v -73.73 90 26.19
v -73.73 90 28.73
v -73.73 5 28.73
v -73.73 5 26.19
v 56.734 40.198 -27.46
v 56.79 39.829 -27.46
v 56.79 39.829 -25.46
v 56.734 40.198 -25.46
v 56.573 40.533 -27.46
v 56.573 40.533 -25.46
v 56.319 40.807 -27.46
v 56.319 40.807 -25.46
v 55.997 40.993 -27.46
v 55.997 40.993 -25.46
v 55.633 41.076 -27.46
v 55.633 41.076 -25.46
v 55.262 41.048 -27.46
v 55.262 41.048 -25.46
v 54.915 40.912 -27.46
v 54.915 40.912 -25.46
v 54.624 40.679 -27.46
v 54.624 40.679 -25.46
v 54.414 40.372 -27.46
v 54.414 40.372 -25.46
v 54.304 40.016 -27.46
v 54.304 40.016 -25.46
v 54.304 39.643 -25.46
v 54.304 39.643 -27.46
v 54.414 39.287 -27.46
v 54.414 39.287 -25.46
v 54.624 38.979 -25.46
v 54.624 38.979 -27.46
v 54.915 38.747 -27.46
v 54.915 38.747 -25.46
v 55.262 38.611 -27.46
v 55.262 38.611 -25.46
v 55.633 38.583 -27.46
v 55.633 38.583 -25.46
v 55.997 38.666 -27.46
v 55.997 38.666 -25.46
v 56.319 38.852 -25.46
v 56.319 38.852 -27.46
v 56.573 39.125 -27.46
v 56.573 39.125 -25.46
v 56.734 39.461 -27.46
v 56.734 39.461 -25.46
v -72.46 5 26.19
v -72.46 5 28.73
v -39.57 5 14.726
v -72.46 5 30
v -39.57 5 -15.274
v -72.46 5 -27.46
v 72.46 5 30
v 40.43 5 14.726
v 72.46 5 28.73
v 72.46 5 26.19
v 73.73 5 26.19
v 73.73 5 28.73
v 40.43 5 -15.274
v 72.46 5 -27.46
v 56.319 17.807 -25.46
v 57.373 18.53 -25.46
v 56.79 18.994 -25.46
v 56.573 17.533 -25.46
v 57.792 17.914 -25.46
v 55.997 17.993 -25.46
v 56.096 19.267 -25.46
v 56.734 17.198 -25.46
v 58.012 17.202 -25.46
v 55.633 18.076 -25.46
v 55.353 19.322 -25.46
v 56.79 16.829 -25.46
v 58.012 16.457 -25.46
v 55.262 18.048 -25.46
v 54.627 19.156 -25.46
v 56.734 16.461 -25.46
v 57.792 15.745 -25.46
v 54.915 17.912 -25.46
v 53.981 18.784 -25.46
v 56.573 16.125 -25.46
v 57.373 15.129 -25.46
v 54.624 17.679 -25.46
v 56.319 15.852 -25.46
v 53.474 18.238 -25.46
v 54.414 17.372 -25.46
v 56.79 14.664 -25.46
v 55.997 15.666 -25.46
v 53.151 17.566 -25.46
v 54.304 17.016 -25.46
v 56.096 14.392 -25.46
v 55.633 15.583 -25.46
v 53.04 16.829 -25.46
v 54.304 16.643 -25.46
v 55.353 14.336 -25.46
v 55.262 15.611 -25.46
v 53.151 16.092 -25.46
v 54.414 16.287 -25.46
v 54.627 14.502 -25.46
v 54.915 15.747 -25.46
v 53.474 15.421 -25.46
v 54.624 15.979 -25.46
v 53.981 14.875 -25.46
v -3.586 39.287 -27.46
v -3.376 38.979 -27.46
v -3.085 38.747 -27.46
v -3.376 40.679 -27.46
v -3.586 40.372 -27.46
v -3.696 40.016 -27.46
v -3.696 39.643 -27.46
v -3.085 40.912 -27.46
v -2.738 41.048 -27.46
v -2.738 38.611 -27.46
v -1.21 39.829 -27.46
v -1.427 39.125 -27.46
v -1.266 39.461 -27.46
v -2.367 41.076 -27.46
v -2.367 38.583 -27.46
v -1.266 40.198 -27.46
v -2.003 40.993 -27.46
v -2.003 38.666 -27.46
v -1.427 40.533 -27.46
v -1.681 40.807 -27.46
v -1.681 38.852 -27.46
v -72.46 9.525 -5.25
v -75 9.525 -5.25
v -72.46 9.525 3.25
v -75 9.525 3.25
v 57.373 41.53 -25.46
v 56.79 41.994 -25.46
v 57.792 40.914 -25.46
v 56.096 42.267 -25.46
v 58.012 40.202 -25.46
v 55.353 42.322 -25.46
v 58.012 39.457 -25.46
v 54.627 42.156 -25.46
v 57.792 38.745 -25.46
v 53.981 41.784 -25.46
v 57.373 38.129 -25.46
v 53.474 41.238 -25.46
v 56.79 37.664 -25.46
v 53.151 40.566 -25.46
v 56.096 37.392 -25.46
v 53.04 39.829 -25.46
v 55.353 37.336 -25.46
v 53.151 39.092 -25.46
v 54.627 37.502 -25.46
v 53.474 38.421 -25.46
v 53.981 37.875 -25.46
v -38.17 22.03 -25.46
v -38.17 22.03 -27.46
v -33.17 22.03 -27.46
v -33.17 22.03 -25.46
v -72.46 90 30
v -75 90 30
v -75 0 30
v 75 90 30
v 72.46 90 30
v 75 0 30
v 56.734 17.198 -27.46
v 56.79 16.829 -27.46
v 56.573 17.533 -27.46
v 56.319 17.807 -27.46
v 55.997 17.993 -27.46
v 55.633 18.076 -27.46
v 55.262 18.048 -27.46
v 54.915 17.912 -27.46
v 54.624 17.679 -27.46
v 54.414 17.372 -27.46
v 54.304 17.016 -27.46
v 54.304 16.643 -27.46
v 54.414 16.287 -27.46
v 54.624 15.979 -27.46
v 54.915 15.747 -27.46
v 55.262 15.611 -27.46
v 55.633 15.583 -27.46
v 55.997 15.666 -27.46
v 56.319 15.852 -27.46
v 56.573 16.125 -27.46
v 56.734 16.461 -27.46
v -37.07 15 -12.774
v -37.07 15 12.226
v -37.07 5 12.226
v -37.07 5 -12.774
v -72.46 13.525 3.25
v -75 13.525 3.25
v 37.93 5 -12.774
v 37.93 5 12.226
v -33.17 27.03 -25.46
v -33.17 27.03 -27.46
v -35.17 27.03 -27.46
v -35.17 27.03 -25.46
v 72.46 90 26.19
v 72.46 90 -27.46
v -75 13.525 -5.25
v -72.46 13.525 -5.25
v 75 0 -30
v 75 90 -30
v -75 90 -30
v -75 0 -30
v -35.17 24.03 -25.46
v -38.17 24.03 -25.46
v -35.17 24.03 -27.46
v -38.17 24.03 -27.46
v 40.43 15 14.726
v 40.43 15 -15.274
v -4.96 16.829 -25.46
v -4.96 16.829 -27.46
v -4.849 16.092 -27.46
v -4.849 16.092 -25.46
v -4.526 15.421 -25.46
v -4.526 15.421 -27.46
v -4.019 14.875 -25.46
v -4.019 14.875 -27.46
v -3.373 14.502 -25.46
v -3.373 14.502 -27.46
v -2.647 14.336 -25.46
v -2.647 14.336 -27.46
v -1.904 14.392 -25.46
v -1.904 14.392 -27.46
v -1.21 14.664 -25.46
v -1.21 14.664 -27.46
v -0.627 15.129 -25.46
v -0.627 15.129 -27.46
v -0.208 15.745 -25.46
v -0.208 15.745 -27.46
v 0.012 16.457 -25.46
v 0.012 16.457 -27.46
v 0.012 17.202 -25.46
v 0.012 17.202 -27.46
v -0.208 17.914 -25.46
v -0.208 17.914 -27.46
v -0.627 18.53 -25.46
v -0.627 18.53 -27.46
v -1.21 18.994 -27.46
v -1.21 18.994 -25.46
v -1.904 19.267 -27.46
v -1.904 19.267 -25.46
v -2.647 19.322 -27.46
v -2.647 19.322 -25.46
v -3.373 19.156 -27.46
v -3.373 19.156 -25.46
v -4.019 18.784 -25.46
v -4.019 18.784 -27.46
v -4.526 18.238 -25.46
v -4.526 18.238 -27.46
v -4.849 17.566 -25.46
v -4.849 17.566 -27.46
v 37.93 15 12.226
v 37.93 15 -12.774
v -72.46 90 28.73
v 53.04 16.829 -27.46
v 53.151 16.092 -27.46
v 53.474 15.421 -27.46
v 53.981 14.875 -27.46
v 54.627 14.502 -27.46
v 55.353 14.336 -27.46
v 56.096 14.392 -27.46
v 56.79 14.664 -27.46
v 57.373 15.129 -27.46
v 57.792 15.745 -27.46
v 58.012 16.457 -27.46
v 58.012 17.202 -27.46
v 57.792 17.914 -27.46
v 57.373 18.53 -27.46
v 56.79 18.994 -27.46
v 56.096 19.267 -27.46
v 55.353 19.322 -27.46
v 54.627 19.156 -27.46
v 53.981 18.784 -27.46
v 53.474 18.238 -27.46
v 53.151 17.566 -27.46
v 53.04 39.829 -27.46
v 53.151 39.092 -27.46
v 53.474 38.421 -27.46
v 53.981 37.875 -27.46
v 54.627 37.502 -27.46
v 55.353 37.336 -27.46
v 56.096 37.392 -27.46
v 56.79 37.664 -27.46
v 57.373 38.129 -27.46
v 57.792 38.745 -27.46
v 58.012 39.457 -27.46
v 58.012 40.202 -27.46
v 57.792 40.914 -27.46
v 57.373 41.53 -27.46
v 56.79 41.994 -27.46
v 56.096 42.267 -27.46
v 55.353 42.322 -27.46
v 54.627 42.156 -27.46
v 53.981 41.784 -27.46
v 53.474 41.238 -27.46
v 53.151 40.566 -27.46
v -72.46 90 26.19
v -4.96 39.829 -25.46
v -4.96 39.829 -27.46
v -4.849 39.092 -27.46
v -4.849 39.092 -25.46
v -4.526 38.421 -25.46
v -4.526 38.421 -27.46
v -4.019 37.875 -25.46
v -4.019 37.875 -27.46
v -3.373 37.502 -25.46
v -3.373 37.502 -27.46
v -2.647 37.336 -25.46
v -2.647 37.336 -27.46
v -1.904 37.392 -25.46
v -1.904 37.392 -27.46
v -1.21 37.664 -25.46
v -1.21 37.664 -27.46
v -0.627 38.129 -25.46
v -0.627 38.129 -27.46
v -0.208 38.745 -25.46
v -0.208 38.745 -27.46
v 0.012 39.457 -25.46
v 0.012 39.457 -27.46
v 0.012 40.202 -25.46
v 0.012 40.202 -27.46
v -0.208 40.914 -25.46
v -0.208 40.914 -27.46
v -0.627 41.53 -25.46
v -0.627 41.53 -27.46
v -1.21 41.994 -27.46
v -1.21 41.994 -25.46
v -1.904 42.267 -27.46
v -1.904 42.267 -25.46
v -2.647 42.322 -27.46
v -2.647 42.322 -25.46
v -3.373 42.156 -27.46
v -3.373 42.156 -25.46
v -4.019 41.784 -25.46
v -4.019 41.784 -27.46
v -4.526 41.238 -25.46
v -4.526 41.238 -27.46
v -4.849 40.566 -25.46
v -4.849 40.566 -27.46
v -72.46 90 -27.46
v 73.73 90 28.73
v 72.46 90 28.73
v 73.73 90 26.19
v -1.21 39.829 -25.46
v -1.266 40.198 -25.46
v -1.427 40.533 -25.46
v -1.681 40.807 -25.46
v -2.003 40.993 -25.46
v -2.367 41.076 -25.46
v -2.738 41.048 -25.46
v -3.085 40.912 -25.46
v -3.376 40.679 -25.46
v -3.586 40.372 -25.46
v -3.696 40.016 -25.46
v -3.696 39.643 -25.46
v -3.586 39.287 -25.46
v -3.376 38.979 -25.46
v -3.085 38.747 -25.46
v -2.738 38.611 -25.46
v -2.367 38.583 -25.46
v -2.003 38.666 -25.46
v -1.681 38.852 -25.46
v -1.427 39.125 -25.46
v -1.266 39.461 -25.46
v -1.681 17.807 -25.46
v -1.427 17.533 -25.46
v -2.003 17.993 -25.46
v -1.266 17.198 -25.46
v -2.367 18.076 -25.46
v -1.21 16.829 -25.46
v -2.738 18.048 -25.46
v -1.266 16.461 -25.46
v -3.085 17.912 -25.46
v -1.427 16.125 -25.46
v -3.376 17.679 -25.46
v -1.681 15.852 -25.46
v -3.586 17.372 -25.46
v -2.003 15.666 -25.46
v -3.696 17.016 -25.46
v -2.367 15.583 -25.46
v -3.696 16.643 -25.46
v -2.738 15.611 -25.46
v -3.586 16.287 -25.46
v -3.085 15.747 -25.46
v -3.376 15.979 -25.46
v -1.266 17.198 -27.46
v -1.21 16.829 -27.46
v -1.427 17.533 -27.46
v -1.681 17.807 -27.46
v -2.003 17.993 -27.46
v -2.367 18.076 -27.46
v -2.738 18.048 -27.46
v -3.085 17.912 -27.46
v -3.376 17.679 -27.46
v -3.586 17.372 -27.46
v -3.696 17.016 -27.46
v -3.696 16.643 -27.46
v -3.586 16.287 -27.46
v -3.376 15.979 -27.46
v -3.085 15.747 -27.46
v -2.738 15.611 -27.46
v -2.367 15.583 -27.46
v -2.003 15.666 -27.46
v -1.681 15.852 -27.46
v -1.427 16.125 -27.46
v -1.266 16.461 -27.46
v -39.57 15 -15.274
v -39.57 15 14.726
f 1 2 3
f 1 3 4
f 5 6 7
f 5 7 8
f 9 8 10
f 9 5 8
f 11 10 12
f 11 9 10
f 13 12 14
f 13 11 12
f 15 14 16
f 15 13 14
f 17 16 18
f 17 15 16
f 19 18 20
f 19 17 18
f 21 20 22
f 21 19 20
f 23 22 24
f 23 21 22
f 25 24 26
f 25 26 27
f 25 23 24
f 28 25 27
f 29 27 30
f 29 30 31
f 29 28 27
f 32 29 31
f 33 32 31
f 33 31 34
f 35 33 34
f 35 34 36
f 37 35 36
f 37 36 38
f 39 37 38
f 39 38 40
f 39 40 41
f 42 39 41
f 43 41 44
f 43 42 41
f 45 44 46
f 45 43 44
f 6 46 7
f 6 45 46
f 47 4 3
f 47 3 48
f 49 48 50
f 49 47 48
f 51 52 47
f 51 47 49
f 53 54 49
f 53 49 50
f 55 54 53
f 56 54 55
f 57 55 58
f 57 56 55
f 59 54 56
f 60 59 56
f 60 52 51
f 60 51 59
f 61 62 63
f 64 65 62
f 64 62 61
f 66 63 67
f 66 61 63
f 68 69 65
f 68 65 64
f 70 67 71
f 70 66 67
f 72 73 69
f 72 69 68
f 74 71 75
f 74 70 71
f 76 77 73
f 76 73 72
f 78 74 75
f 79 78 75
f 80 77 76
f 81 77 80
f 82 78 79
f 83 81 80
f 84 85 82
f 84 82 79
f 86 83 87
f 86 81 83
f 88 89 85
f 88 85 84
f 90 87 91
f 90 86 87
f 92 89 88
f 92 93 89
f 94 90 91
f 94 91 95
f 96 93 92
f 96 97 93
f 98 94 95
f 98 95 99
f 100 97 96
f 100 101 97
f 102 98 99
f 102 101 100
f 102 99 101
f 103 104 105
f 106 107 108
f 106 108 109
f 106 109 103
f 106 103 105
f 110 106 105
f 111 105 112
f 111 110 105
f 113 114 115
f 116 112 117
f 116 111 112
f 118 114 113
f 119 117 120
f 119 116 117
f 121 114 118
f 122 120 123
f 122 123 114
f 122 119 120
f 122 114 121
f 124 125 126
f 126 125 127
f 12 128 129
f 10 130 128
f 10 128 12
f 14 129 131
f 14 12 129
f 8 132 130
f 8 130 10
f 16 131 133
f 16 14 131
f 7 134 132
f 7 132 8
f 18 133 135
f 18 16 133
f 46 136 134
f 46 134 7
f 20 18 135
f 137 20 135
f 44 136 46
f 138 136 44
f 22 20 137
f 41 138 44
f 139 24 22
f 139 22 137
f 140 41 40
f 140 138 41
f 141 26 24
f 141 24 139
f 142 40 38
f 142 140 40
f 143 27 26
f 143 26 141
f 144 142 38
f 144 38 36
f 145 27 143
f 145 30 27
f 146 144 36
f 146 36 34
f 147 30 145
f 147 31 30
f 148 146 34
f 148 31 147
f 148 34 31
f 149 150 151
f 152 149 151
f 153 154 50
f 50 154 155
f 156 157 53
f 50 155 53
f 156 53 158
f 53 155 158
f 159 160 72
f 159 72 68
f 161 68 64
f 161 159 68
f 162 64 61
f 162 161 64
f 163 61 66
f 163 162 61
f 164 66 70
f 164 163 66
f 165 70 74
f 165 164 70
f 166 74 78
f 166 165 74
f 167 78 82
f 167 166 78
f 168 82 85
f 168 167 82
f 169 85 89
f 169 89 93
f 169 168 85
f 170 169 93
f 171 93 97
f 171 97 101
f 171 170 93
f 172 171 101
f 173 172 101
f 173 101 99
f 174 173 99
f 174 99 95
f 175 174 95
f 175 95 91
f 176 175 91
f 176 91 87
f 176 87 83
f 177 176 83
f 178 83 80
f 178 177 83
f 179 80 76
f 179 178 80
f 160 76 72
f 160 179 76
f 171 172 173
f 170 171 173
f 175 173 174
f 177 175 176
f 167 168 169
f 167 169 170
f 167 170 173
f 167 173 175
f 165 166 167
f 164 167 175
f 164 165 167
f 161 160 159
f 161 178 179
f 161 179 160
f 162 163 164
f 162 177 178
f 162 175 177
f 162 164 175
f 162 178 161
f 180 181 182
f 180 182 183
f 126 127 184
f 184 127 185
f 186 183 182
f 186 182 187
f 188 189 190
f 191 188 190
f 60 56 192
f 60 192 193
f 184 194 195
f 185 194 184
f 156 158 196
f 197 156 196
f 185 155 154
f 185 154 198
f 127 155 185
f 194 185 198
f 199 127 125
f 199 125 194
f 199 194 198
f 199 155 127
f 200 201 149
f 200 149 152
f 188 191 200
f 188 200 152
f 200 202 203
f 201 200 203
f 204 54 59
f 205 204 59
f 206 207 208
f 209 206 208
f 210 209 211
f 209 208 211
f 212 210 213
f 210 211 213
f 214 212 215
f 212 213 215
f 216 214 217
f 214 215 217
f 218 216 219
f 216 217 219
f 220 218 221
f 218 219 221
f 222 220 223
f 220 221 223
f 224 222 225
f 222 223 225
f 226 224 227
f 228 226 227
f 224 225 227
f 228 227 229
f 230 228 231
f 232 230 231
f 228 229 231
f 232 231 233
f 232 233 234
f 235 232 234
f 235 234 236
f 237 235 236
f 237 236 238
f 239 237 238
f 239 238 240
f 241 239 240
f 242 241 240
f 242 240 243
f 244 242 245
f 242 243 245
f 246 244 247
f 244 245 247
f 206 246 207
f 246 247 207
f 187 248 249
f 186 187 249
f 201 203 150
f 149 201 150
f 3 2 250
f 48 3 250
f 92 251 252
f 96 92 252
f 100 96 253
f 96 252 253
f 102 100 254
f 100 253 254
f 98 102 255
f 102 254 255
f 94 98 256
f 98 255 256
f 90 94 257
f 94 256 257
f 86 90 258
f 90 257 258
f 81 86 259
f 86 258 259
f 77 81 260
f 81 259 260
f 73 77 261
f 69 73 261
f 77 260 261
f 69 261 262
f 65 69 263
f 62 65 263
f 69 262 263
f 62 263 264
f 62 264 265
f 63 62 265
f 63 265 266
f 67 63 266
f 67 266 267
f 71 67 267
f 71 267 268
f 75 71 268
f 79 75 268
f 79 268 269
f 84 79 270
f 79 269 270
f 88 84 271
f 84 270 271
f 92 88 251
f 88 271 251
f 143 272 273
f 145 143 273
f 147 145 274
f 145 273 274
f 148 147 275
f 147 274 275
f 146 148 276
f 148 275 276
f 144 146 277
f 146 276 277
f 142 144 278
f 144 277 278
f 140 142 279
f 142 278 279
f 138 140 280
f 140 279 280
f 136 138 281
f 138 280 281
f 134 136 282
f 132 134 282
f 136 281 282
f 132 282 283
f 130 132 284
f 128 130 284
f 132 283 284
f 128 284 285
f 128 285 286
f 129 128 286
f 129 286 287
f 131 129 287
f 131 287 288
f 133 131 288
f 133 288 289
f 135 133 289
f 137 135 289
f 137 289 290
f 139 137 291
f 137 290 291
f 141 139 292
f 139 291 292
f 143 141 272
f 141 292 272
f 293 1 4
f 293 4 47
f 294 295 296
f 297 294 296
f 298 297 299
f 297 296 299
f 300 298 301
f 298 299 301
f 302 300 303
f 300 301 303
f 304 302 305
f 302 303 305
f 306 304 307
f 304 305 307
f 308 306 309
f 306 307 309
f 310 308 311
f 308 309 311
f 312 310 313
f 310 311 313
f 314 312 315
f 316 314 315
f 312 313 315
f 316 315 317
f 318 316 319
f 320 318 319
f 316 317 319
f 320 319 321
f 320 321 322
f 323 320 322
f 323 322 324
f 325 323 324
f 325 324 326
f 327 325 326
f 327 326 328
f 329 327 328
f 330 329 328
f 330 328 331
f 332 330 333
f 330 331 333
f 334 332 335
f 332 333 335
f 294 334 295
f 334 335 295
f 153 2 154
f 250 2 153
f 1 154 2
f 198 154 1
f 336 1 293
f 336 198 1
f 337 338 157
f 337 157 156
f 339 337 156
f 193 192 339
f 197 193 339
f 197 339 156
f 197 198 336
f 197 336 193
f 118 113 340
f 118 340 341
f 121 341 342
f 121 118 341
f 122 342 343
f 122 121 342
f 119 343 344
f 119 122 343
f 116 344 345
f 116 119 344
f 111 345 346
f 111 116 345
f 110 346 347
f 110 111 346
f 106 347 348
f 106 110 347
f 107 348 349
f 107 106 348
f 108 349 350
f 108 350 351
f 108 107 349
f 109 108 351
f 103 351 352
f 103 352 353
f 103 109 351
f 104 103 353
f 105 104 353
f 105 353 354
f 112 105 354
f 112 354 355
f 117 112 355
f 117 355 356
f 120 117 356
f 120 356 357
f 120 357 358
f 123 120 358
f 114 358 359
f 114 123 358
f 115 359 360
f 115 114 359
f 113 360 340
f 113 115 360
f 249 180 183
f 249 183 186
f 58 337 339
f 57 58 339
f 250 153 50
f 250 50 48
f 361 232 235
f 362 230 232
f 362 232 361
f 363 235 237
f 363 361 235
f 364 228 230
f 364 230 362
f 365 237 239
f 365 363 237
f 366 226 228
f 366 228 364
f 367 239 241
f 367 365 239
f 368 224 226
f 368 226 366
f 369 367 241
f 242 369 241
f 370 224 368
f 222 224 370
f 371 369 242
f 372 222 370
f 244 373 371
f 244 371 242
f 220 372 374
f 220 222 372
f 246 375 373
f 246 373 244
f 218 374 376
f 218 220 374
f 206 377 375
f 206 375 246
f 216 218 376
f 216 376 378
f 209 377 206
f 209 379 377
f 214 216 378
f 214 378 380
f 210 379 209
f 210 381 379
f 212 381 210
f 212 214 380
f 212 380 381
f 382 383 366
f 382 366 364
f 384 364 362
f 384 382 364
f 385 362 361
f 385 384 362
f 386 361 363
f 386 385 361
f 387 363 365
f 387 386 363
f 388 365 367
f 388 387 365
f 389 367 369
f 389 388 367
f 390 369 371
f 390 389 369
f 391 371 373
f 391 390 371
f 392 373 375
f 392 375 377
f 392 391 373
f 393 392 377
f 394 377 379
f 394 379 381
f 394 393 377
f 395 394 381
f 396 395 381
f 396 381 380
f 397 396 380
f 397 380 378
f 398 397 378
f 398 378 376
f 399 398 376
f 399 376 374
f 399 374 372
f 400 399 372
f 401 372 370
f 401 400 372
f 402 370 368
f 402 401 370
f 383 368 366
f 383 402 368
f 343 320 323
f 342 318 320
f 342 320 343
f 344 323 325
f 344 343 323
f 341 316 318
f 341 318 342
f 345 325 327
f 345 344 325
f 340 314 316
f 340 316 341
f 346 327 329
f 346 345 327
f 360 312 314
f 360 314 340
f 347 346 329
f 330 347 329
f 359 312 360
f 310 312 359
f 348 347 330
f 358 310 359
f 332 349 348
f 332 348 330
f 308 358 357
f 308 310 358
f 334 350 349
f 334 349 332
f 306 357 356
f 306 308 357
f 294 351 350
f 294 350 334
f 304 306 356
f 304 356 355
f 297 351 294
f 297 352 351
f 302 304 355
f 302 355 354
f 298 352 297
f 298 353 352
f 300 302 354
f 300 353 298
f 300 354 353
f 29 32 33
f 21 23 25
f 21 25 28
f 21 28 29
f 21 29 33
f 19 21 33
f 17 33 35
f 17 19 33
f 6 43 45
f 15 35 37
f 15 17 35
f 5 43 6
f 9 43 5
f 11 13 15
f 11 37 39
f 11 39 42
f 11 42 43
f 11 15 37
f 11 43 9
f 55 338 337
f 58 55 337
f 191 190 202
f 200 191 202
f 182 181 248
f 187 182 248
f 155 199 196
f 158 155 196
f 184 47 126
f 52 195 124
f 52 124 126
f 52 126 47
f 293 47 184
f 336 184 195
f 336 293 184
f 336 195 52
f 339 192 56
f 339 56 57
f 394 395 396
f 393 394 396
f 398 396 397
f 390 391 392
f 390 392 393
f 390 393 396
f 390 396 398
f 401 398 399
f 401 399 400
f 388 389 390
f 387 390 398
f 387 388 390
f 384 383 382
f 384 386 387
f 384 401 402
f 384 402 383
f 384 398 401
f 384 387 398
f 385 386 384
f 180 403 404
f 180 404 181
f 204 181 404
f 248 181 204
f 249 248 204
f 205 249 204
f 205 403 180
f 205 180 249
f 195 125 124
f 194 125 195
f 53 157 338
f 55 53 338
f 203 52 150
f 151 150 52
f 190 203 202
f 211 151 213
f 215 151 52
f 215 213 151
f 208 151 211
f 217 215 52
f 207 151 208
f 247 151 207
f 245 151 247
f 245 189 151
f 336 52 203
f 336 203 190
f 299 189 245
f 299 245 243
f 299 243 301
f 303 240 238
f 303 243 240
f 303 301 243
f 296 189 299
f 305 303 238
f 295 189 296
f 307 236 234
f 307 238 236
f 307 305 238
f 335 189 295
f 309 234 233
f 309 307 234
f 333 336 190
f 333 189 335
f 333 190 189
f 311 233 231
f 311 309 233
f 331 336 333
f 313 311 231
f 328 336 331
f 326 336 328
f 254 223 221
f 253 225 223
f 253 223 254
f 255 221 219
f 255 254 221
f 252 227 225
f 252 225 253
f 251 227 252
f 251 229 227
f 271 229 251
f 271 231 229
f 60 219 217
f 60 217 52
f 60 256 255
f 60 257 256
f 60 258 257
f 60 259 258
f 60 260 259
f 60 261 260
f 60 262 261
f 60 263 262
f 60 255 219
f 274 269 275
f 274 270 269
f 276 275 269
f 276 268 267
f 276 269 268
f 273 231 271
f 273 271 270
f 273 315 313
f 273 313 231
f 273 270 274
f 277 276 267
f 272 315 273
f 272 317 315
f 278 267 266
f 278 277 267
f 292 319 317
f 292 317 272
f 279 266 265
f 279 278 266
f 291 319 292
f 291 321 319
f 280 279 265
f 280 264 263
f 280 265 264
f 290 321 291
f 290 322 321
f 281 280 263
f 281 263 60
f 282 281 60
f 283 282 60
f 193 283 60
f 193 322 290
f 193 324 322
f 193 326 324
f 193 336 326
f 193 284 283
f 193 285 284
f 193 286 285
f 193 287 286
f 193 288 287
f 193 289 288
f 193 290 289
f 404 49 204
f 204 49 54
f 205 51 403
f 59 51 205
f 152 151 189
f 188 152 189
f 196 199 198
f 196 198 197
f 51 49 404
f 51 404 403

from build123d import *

# Parameters (mm, degrees)
SKETCH1_W           = 150
SKETCH1_H           = 60
BOSS_EXTRUDE1_DEPTH = 90
SKETCH2_W           = 144.92
SKETCH2_H           = 60
CUT_EXTRUDE1_DEPTH  = 85
SKETCH6_R           = 2.499995
SKETCH6_R_2         = 1.25
BOSS_EXTRUDE2_DEPTH = 2
BOSS_EXTRUDE3_DEPTH = 2
SKETCH8_W           = 8.5
SKETCH8_H           = 4
CUT_EXTRUDE4_DEPTH  = 2.54
SKETCH12_W          = 80
SKETCH12_H          = 30
BOSS_EXTRUDE5_DEPTH = 10
SKETCH13_W          = 75
SKETCH13_H          = 25
CUT_EXTRUDE6_DEPTH  = 10
SKETCH16_W          = 1.27
SKETCH16_H          = 2.54
CUT_EXTRUDE7_DEPTH  = 85


with BuildPart() as part:
    # Sketch1 → Boss-Extrude1 (new body)
    with BuildSketch(Plane(origin=(0, 0, 0), x_dir=(1, 0, 0), z_dir=(0, 1, 0))):
        Rectangle(SKETCH1_W, SKETCH1_H)
    extrude(amount=BOSS_EXTRUDE1_DEPTH)

    # Sketch2 → Cut-Extrude1 (cut)
    with BuildSketch(Plane(origin=(0, 90, 0), x_dir=(1, 0, 0), z_dir=(0, 1, 0))):
        with Locations((0, -2.54)):
            Rectangle(SKETCH2_W, SKETCH2_H)
    extrude(amount=-CUT_EXTRUDE1_DEPTH, mode=Mode.SUBTRACT)

    # Sketch6 → Boss-Extrude2 (add)
    # profile 1 of 4: a face of its own
    with BuildSketch(Plane.XY.offset(-27.46)):
        with Locations(Location((-2.46, 39.829239544, 0), (0, 0, 180))):
            Circle(SKETCH6_R)
        with Locations((-2.46, 39.829239544)):
            Circle(SKETCH6_R_2, mode=Mode.SUBTRACT)
    # profile 2 of 4: a face of its own
    with BuildSketch(Plane.XY.offset(-27.46)):
        with Locations(Location((55.54, 39.829239544, 0), (0, 0, 180))):
            Circle(SKETCH6_R)
        with Locations((55.54, 39.829239544)):
            Circle(SKETCH6_R_2, mode=Mode.SUBTRACT)
    # profile 3 of 4: a face of its own
    with BuildSketch(Plane.XY.offset(-27.46)):
        with Locations(Location((55.54, 16.829239544, 0), (0, 0, 180))):
            Circle(SKETCH6_R)
        with Locations((55.54, 16.829239544)):
            Circle(SKETCH6_R_2, mode=Mode.SUBTRACT)
    # profile 4 of 4: a face of its own
    with BuildSketch(Plane.XY.offset(-27.46)):
        with Locations(Location((-2.46, 16.829239544, 0), (0, 0, 180))):
            Circle(SKETCH6_R)
        with Locations((-2.46, 16.829239544)):
            Circle(SKETCH6_R_2, mode=Mode.SUBTRACT)
    extrude(amount=BOSS_EXTRUDE2_DEPTH)

    # Sketch7 → Boss-Extrude3 (add)
    with BuildSketch(Plane.XY.offset(-27.46)):
        Polygon((-38.17, 24.030063331), (-38.17, 22.030063331), (-33.17, 22.030063331), (-33.17, 27.030063331), (-35.17, 27.030063331), (-35.17, 24.030063331), align=None)
    extrude(amount=BOSS_EXTRUDE3_DEPTH)

    # Sketch8 → Cut-Extrude4 (cut)
    with BuildSketch(Plane.ZY.offset(75)):
        with Locations((-1, 11.52476666)):
            Rectangle(SKETCH8_W, SKETCH8_H)
    extrude(amount=-CUT_EXTRUDE4_DEPTH, mode=Mode.SUBTRACT)

    # Sketch12 → Boss-Extrude5 (add)
    with BuildSketch(Plane(origin=(0, 5, 0), x_dir=(1, 0, 0), z_dir=(0, 1, 0))):
        with Locations((0.430037325, 0.273645115)):
            Rectangle(SKETCH12_W, SKETCH12_H)
    extrude(amount=BOSS_EXTRUDE5_DEPTH)

    # Sketch13 → Cut-Extrude6 (cut)
    with BuildSketch(Plane(origin=(0, 15, 0), x_dir=(1, 0, 0), z_dir=(0, 1, 0))):
        with Locations((0.430037325, 0.273645115)):
            Rectangle(SKETCH13_W, SKETCH13_H)
    extrude(amount=-CUT_EXTRUDE6_DEPTH, mode=Mode.SUBTRACT)

    # Sketch16 → Cut-Extrude7 (cut)
    with BuildSketch(Plane(origin=(0, 90, 0), x_dir=(1, 0, 0), z_dir=(0, 1, 0))):
        with Locations((-73.095, -27.46)):
            Rectangle(SKETCH16_W, SKETCH16_H)
        with Locations((73.095, -27.46)):
            Rectangle(SKETCH16_W, SKETCH16_H)
    extrude(amount=-CUT_EXTRUDE7_DEPTH, mode=Mode.SUBTRACT)


solid = part.part
